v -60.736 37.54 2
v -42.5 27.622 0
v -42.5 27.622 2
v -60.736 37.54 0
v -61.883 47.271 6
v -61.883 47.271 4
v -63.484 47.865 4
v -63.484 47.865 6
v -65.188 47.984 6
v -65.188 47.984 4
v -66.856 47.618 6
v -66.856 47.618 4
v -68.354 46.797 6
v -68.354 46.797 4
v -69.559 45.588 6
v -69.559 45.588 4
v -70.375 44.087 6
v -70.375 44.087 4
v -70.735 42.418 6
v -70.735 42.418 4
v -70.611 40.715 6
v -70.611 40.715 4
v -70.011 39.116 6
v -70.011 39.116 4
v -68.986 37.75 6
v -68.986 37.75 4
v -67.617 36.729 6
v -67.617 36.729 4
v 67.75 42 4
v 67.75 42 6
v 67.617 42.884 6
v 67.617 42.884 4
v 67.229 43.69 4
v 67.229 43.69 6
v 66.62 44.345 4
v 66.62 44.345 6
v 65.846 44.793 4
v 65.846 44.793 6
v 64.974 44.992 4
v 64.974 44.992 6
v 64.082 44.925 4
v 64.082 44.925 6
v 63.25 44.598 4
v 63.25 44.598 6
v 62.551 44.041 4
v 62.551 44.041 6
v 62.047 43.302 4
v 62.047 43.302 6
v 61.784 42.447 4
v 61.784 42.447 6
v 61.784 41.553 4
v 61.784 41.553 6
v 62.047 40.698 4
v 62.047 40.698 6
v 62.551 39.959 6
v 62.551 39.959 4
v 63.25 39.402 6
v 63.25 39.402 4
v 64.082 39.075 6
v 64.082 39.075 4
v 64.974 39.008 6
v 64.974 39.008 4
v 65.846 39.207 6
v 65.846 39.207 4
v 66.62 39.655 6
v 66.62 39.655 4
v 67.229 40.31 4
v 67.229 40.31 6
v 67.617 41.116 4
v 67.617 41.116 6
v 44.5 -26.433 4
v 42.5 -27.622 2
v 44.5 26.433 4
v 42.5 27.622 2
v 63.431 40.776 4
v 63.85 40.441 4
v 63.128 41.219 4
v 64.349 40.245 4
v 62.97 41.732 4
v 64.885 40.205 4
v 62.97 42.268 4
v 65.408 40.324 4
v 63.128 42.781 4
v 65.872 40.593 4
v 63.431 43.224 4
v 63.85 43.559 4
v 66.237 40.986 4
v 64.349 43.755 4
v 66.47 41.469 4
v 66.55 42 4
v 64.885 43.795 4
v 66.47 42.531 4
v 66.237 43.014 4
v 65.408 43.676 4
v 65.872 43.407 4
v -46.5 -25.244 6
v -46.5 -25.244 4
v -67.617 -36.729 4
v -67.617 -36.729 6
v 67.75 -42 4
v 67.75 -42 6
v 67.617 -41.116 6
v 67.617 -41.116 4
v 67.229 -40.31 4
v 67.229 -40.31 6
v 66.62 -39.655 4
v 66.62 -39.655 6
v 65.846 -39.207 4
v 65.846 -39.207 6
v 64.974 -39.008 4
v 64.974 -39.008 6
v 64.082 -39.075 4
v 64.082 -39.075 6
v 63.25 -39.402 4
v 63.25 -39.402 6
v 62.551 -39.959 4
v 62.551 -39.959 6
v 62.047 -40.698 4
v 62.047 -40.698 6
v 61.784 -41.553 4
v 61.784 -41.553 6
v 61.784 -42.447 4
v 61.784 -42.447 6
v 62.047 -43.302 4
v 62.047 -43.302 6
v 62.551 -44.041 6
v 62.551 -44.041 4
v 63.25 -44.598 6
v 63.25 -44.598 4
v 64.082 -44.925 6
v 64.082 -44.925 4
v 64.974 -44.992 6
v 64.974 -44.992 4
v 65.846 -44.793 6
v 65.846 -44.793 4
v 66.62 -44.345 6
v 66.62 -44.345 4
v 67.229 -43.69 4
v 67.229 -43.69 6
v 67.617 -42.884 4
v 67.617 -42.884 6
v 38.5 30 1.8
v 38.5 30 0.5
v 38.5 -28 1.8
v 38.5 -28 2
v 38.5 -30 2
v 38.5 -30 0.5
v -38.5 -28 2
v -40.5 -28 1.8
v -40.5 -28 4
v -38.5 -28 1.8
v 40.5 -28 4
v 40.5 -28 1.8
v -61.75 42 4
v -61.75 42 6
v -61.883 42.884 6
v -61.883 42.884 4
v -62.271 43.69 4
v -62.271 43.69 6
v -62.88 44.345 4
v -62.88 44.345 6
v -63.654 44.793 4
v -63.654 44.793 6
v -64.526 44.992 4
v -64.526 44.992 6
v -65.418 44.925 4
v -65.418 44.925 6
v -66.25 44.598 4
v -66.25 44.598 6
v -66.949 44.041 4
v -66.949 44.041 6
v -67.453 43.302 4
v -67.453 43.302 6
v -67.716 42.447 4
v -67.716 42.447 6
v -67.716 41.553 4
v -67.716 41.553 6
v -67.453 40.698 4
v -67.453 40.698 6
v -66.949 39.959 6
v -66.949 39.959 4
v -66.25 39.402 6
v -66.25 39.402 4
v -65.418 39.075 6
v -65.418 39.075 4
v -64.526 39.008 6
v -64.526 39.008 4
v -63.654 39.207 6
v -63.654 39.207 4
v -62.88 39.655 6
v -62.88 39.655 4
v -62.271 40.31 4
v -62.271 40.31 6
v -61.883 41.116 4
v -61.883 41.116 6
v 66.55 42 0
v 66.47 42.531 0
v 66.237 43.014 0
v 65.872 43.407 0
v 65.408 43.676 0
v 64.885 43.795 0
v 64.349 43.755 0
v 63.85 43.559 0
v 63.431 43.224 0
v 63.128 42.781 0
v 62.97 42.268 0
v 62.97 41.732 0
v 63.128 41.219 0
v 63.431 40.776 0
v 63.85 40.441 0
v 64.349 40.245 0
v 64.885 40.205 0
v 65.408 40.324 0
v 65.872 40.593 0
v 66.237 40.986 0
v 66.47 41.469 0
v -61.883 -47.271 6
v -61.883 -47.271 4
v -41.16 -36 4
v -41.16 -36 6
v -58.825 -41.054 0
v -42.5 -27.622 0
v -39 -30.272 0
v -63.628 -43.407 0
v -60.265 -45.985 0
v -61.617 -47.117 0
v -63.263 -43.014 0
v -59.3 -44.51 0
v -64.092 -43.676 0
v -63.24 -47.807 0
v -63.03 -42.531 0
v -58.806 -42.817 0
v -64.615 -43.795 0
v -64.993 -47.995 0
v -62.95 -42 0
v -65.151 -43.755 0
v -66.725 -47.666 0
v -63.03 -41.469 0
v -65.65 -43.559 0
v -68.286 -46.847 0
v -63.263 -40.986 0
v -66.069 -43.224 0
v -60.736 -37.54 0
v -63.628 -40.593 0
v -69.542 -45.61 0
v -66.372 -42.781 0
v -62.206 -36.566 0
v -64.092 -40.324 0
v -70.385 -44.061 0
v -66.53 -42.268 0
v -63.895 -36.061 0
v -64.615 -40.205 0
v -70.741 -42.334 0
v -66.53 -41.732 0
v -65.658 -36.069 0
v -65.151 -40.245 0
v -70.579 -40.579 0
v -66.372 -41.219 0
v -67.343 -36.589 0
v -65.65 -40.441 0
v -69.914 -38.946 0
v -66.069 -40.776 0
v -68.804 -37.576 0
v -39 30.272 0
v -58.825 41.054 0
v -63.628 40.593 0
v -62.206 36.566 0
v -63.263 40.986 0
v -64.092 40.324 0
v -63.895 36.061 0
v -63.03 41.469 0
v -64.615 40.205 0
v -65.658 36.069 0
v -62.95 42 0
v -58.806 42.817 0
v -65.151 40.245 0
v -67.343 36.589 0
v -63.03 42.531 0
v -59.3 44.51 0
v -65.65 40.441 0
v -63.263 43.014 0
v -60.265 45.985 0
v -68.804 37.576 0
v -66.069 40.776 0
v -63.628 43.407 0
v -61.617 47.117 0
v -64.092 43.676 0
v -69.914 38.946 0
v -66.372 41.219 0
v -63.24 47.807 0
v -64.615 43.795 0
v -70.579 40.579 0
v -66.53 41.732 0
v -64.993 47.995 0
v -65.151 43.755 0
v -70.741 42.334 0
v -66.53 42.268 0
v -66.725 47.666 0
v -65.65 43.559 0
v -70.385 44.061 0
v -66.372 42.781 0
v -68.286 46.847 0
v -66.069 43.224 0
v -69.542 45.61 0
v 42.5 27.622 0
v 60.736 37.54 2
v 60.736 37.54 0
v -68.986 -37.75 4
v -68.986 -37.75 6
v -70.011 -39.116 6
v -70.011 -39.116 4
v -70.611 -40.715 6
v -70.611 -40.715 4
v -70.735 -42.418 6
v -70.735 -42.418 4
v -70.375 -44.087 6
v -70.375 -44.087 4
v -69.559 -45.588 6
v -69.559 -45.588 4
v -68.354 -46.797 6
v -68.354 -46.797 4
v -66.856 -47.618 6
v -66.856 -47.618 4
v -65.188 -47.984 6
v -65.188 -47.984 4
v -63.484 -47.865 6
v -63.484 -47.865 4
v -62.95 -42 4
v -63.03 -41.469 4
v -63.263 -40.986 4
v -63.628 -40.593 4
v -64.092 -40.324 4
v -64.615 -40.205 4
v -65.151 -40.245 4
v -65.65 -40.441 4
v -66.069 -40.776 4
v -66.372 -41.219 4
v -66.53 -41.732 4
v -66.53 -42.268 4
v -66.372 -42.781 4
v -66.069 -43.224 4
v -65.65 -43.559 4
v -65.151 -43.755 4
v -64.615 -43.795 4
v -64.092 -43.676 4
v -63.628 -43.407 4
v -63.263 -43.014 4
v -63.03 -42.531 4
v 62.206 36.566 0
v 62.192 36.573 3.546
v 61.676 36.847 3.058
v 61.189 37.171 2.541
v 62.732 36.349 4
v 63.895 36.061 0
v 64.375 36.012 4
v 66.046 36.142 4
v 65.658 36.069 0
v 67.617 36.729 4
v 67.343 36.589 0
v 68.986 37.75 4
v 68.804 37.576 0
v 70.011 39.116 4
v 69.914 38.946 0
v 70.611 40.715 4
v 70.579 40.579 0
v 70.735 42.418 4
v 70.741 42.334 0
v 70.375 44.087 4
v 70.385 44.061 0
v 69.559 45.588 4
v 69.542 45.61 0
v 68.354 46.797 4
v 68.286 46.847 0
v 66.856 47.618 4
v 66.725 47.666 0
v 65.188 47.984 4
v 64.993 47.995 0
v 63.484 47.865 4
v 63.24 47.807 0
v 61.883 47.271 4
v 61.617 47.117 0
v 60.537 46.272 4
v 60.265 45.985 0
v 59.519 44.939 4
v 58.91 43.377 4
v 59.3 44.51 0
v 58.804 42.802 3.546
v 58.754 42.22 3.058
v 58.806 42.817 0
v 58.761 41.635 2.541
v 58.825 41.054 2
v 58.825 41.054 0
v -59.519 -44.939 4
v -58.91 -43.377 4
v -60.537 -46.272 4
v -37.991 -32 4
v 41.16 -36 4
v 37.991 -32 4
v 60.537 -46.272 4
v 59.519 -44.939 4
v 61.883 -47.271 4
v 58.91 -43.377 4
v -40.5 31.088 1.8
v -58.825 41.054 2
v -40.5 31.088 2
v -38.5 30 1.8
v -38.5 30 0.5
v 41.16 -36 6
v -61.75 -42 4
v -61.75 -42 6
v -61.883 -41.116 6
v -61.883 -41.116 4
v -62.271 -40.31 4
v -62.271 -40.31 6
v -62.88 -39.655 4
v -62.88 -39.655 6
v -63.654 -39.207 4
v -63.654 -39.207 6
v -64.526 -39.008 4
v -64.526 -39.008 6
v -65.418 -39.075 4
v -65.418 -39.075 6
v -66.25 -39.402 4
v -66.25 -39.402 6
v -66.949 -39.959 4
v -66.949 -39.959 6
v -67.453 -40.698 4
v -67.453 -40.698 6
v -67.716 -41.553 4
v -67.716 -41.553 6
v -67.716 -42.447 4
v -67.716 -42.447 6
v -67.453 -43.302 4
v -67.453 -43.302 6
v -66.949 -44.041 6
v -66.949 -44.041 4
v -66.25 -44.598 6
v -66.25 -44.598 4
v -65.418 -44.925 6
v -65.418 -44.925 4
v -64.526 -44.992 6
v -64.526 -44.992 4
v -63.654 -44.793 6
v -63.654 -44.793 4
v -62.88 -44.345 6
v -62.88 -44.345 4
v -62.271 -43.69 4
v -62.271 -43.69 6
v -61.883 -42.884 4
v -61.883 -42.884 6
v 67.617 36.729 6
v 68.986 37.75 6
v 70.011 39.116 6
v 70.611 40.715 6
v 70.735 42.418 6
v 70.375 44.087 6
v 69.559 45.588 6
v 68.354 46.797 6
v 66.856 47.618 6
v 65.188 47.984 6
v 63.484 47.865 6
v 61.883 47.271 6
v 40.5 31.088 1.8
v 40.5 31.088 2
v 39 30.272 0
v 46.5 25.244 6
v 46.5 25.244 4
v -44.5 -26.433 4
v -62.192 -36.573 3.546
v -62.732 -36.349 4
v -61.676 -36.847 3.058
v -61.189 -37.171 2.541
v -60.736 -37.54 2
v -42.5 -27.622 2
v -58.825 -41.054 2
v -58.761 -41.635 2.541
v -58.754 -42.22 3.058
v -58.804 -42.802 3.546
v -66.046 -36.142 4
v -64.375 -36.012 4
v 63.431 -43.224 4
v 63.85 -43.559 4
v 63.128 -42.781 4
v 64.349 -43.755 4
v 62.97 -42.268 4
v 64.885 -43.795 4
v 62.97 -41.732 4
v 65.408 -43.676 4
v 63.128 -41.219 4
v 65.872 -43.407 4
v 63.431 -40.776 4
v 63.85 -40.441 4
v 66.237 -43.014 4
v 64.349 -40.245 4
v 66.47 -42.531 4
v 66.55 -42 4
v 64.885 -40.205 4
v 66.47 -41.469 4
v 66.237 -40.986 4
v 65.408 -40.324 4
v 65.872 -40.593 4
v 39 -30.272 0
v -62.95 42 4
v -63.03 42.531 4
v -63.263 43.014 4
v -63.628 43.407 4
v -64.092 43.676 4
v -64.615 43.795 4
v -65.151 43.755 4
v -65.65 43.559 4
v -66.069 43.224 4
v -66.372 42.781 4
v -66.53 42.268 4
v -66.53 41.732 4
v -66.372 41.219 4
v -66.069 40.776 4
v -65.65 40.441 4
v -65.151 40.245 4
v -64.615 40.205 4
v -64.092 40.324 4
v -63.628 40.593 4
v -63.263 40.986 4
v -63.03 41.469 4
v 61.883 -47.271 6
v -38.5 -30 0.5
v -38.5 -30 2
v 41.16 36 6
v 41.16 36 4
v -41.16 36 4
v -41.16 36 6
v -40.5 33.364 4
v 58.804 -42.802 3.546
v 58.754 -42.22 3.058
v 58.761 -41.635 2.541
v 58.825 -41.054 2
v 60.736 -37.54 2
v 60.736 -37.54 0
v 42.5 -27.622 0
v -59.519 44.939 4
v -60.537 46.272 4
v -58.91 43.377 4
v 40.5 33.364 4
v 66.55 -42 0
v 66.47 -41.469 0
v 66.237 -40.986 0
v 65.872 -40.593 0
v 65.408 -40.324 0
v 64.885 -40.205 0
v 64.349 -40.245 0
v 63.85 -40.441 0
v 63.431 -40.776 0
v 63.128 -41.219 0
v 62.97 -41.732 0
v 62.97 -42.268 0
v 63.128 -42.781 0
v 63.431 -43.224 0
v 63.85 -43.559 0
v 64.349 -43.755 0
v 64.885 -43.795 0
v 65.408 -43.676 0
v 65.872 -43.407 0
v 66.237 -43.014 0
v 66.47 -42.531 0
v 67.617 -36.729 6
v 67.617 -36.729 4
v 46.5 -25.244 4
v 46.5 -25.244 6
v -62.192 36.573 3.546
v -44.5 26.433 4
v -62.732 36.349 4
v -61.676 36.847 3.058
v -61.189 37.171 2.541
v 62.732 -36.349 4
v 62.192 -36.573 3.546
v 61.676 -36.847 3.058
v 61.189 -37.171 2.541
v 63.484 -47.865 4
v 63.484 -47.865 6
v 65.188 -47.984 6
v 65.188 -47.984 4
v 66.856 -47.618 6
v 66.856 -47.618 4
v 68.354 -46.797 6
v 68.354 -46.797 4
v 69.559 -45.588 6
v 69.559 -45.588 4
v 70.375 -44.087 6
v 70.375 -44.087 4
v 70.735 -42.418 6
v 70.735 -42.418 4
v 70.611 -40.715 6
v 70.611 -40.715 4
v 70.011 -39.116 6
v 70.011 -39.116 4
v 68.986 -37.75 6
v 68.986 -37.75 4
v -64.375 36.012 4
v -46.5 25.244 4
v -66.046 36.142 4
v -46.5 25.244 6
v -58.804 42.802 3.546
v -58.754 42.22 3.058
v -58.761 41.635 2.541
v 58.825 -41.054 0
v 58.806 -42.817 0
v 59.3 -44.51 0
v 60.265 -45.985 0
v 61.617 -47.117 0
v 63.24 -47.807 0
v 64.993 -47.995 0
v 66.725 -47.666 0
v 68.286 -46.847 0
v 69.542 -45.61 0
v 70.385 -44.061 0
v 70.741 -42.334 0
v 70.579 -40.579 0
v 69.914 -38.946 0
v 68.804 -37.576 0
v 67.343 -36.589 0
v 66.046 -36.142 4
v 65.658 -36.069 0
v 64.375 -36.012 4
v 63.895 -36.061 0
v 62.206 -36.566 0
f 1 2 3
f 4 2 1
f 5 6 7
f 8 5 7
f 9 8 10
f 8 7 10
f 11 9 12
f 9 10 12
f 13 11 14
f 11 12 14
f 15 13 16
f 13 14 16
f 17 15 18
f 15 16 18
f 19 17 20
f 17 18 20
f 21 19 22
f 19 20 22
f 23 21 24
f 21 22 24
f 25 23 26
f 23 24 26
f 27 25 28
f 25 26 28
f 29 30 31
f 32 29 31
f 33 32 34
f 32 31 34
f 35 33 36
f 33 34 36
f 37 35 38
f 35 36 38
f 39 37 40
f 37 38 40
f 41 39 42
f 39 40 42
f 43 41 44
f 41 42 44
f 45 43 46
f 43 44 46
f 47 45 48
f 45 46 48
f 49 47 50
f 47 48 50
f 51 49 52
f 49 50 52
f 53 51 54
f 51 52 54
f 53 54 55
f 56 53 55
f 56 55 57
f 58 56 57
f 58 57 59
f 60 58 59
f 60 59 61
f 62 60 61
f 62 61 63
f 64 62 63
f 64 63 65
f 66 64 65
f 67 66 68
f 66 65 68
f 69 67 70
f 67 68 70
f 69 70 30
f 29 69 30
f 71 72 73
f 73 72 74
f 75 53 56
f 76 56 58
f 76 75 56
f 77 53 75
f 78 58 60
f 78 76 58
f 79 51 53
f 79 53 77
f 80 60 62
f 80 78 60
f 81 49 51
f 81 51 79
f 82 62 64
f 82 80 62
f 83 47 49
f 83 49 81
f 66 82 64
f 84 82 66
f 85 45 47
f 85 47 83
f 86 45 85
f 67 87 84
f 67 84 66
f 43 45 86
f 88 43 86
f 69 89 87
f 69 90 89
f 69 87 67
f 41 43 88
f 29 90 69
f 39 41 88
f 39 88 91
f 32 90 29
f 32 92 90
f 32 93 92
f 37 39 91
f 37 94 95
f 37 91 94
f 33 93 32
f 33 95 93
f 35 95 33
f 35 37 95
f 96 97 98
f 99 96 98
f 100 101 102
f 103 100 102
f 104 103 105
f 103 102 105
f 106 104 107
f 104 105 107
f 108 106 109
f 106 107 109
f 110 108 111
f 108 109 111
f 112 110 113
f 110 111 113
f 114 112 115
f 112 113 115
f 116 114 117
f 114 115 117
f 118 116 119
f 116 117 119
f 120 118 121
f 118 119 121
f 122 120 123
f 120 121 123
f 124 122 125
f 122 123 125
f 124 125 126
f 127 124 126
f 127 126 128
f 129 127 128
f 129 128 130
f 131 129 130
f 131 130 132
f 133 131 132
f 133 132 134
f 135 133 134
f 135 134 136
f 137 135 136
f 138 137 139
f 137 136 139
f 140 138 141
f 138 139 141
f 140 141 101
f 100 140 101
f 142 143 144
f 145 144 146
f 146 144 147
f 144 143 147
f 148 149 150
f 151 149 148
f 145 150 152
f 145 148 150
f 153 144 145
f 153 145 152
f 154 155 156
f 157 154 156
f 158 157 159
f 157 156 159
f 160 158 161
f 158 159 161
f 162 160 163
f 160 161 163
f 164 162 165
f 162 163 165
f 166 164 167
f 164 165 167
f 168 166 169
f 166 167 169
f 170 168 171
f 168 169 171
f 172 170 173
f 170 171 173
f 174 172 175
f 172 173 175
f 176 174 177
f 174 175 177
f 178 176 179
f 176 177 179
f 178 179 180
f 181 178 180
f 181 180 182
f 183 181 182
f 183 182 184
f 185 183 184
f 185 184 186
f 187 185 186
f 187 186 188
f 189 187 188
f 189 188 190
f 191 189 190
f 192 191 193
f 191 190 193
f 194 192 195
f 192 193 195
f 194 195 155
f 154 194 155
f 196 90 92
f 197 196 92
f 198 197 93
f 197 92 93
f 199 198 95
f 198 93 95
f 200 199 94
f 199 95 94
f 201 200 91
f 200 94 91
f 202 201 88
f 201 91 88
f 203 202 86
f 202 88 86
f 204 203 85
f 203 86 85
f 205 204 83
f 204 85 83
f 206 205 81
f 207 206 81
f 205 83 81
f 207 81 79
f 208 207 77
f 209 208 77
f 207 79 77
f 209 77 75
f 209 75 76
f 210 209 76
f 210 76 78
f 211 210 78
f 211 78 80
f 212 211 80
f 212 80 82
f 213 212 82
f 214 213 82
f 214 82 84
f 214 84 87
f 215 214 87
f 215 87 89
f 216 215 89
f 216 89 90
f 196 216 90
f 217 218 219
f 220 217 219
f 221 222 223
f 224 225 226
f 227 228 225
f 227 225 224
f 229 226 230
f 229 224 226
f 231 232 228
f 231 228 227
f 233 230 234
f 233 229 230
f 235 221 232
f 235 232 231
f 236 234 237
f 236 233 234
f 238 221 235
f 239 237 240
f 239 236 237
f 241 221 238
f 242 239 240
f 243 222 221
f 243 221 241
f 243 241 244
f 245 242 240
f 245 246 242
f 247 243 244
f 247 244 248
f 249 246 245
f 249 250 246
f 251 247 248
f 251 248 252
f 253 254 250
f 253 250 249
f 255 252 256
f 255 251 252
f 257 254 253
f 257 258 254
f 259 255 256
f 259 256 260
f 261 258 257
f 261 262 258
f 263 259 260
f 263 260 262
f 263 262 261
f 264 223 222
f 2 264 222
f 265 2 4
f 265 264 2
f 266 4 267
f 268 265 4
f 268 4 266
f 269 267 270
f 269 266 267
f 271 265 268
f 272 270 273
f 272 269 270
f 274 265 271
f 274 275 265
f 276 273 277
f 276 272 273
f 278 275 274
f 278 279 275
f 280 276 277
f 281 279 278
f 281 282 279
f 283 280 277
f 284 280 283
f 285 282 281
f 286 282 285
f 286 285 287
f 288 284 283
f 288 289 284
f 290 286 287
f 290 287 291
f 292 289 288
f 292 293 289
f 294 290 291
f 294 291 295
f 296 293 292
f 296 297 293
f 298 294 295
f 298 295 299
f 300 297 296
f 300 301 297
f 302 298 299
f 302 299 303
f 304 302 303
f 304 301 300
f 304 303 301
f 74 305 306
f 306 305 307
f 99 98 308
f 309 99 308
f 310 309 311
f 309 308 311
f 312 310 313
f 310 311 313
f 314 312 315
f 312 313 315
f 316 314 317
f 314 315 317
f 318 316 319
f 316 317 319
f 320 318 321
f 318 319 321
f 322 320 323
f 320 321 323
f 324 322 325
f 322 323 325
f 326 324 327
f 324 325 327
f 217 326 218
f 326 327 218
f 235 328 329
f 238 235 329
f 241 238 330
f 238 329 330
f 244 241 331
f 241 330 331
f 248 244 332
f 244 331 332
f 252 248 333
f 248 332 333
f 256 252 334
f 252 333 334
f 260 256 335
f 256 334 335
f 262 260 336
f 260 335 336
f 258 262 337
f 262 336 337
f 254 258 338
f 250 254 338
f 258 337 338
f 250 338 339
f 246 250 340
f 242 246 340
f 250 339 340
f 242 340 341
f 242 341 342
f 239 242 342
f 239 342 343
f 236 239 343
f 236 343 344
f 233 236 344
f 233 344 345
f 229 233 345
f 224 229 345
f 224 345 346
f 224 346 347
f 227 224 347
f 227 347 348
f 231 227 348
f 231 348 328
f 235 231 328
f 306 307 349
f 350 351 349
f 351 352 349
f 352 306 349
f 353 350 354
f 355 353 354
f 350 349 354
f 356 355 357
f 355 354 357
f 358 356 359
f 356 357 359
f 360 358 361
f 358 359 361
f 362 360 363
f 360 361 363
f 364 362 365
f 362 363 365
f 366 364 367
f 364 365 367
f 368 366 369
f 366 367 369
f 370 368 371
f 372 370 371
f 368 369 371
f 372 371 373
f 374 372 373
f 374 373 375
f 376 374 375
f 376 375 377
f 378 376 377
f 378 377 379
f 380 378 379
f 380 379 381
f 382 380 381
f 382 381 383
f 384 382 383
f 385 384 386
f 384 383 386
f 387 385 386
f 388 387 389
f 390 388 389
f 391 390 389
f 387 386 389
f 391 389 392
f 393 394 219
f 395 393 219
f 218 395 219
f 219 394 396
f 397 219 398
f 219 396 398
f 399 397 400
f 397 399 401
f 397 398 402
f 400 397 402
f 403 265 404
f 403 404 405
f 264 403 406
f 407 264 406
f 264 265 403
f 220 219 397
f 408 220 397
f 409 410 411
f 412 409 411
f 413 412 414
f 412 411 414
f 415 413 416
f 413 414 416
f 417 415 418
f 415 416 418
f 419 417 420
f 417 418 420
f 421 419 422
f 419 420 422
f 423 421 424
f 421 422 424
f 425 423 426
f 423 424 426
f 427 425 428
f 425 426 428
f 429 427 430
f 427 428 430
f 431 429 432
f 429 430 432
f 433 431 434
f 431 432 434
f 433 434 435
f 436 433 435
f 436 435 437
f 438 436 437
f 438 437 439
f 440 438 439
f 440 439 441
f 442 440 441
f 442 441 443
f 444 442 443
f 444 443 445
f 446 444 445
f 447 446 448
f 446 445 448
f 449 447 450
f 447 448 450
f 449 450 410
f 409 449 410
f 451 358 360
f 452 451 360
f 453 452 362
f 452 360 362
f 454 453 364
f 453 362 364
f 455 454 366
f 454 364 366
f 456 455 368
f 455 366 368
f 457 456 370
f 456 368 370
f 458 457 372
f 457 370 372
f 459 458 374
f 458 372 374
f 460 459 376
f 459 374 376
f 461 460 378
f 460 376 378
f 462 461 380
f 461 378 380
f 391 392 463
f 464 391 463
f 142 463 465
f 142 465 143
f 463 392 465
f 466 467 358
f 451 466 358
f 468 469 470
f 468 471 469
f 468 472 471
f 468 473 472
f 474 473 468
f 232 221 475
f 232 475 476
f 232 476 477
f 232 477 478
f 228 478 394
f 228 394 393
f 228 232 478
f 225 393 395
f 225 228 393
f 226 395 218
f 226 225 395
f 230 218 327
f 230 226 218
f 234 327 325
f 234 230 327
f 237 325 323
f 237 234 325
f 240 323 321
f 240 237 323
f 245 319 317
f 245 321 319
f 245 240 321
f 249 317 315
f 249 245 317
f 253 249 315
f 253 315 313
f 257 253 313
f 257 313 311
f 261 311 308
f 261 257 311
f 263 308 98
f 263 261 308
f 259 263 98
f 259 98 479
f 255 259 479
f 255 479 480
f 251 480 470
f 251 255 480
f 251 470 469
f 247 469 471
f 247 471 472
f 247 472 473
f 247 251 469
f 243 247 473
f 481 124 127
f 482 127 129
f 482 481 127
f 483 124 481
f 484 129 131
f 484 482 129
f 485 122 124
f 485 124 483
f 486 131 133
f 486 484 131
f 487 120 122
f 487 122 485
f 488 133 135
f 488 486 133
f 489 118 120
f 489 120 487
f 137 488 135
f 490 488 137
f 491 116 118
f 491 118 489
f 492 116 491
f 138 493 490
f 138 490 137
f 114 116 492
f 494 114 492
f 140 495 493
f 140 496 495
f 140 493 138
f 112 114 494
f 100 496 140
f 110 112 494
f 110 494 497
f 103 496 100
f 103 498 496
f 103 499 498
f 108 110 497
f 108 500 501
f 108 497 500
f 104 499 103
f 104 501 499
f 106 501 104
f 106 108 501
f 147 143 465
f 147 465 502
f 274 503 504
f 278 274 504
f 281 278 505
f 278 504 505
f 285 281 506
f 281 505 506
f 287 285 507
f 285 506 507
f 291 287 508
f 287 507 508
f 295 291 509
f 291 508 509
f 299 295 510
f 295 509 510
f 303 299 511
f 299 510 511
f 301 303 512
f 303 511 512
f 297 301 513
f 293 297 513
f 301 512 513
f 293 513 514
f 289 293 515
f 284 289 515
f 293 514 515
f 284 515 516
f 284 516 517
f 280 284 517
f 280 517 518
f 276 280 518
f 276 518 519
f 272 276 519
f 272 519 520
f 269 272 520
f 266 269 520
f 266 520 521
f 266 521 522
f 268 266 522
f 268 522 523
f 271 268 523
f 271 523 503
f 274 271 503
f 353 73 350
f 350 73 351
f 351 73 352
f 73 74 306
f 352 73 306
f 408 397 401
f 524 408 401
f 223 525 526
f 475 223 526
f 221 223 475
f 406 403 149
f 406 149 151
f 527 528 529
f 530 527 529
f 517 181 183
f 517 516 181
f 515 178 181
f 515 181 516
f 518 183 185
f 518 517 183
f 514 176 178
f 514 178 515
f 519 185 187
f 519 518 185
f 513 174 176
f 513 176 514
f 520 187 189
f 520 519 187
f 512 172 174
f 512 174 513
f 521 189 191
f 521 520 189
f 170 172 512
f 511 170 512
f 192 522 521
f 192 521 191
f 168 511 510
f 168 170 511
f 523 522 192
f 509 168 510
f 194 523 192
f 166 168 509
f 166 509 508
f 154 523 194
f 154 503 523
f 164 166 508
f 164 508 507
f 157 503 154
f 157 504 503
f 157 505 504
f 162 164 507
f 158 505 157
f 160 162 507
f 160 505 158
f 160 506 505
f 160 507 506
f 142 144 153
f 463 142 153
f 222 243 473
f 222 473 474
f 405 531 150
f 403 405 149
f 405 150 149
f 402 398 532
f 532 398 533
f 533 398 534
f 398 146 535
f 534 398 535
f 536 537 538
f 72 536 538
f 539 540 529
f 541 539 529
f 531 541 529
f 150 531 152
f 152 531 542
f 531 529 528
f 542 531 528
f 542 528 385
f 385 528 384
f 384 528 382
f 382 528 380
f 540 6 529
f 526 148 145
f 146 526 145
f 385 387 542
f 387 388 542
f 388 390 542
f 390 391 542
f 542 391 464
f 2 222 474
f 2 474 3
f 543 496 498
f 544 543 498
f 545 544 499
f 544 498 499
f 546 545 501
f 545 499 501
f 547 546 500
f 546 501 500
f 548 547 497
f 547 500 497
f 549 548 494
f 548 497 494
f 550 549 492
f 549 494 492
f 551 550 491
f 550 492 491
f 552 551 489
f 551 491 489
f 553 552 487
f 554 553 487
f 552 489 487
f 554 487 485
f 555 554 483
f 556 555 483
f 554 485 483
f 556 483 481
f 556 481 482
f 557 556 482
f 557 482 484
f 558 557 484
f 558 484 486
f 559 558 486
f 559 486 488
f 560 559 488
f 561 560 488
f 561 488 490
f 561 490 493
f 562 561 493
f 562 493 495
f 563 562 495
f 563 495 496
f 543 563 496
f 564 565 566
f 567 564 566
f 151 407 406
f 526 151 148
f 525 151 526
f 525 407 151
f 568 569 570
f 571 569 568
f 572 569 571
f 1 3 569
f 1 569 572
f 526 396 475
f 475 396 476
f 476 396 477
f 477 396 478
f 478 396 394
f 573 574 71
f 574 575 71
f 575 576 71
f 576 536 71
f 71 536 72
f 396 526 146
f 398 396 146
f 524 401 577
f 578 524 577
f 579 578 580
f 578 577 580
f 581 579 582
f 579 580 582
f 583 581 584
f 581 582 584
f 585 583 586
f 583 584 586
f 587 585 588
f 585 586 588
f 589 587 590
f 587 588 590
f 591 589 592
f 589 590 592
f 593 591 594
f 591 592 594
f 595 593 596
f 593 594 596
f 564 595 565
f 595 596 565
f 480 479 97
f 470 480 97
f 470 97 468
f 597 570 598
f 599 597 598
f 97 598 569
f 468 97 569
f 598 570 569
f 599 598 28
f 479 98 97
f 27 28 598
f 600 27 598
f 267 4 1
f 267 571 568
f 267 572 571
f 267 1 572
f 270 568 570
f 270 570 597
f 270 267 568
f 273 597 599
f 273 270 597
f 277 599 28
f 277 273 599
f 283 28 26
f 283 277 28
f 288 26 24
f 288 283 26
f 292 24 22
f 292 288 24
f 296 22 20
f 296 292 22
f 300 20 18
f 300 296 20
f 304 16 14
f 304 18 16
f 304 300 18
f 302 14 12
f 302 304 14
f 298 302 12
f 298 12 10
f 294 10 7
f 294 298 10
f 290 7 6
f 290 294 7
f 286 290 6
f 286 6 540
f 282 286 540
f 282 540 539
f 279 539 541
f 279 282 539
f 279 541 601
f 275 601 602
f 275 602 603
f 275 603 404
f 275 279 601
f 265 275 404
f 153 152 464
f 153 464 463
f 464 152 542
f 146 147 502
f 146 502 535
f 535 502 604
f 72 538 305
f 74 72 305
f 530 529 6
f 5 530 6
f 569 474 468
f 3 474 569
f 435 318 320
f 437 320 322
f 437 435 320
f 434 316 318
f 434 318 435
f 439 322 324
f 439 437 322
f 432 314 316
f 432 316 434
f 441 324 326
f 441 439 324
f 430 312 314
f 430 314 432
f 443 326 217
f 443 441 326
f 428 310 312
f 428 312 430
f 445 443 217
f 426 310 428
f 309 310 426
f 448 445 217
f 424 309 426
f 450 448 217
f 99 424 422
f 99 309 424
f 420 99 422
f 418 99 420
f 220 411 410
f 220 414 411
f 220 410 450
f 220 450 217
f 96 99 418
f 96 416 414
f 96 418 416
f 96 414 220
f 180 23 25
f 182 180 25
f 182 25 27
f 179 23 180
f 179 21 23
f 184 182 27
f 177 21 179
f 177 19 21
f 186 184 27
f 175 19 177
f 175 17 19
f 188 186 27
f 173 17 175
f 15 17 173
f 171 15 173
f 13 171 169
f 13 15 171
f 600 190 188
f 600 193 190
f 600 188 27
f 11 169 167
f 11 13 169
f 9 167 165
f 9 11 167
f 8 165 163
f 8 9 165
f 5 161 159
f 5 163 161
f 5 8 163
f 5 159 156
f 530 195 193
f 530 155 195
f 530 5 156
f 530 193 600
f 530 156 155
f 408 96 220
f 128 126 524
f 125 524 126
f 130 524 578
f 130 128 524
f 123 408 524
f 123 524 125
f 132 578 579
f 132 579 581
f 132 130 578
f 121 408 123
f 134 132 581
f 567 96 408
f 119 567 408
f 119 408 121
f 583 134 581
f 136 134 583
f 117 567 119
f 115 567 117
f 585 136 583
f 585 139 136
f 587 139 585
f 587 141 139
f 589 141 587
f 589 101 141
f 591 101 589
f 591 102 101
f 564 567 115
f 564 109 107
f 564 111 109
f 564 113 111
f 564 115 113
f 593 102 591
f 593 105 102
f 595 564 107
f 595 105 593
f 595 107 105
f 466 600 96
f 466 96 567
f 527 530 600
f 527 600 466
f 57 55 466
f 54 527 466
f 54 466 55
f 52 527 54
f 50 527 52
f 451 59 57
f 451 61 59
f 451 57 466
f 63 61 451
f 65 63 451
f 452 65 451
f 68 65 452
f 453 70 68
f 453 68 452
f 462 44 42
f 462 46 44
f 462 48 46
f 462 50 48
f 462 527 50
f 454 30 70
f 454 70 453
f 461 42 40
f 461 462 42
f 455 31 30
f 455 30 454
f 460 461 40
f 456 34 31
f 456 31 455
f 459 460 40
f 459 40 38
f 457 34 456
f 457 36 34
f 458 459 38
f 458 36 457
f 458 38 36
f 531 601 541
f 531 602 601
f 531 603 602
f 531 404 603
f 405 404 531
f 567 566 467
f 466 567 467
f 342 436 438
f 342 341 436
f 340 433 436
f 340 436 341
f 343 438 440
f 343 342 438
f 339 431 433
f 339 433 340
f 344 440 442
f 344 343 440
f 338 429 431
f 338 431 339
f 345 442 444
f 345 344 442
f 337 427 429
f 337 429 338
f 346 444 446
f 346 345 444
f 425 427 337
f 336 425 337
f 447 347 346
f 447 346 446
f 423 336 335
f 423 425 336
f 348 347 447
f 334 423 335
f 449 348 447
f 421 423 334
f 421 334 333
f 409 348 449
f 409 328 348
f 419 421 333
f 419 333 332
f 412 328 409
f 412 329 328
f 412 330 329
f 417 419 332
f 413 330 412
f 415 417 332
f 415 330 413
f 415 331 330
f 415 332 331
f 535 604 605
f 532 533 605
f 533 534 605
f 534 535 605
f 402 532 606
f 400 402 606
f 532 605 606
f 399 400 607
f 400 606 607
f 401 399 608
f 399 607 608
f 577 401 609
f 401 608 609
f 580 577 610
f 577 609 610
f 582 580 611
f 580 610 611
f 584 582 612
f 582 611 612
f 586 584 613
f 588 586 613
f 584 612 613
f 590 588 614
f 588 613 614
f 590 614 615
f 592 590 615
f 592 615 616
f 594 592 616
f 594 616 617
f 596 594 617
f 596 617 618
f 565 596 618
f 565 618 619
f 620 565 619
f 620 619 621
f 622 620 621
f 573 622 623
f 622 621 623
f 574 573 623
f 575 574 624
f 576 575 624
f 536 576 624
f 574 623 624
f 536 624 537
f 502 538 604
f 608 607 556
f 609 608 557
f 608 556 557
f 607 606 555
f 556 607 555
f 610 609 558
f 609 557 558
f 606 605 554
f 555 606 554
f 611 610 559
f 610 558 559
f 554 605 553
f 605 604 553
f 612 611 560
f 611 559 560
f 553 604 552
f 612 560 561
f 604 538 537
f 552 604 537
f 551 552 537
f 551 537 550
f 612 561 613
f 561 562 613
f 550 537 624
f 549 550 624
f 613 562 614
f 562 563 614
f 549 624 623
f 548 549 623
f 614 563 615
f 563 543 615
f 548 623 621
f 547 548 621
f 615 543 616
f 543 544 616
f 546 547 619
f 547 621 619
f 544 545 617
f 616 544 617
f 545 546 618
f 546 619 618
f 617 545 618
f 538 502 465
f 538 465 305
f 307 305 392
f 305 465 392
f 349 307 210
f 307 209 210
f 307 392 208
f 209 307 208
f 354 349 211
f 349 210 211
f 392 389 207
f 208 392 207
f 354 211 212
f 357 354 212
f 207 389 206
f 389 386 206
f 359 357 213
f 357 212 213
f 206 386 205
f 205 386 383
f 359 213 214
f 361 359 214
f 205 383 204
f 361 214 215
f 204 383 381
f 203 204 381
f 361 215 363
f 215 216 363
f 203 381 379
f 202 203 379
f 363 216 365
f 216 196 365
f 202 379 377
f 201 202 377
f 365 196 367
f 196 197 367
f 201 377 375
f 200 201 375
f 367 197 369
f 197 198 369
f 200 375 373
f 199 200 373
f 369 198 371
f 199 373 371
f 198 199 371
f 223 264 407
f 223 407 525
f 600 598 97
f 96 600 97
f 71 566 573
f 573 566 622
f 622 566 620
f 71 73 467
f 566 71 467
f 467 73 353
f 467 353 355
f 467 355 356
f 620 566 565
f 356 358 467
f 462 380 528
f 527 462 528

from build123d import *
from build123d.topology import SkipClean

# Parameters (mm, degrees)
BOSS_EXTRUDE4_DEPTH            = 4
BOSS_EXTRUDE4_2_DEPTH          = 4
BOSS_EXTRUDE7_START            = 4
SKETCH13_W                     = 77
SKETCH13_H                     = 2
BOSS_EXTRUDE7_DEPTH            = 2
CUT_EXTRUDE3_REACH             = 87.589
SKETCH11_W                     = 2
SKETCH11_H                     = 2.2
CUT_EXTRUDE3_DIRECTION_2_REACH = 87.589
BOSS_EXTRUDE6_DEPTH            = 2
M3_CLEARANCE_HOLE1_D           = 3.6
SKETCH16_R                     = 3
CUT_EXTRUDE4_DEPTH             = 2
CHAMFER2_SIZE                  = 2
CHAMFER3_SIZE                  = 0.5


with BuildPart() as part:
    # Sketch9 → Boss-Extrude4 (new body)
    with BuildSketch(Plane.XY):
        with BuildLine():
            Line((-60.736133913, -37.540305051), (-42.5, -27.622167018))
            Line((-42.5, -27.622167018), (-42.5, 27.622167018))
            Line((-42.5, 27.622167018), (-60.736133913, 37.540305051))
            ThreePointArc((-60.736133913, 37.540305051), (-70.020874221, 44.866685358), (-58.825010341, 41.054221199))
            Line((-58.825010341, 41.054221199), (-38.5, 30))
            Line((-38.5, 30), (-38.5, -30))
            Line((-38.5, -30), (-58.825010341, -41.054221199))
            ThreePointArc((-58.825010341, -41.054221199), (-70.020874221, -44.866685358), (-60.736133913, -37.540305051))
        make_face()
    extrude(amount=BOSS_EXTRUDE4_DEPTH)



with BuildPart() as body_2:
    # Sketch9 → Boss-Extrude4 2 (new body)
    with BuildSketch(Plane.XY):
        with BuildLine():
            Line((38.5, -30), (58.825010341, -41.054221199))
            ThreePointArc((58.825010341, -41.054221199), (70.020874221, -44.866685358), (60.736133913, -37.540305051))
            Line((60.736133913, -37.540305051), (42.5, -27.622167018))
            Line((42.5, -27.622167018), (42.5, 27.622167018))
            Line((42.5, 27.622167018), (60.736133913, 37.540305051))
            ThreePointArc((60.736133913, 37.540305051), (70.020874221, 44.866685358), (58.825010341, 41.054221199))
            Line((58.825010341, 41.054221199), (38.5, 30))
            Line((38.5, 30), (38.5, -30))
        make_face()
    extrude(amount=BOSS_EXTRUDE4_2_DEPTH)


with BuildPart() as part_1:
    add(part.part)

    add(body_2.part)  # Boss-Extrude7 merges body 2
    # Sketch13 → Boss-Extrude7 (add)
    with BuildSketch(Plane.XY.offset(BOSS_EXTRUDE7_START)):
        with Locations((0, -29)):
            Rectangle(SKETCH13_W, SKETCH13_H)
    extrude(amount=-BOSS_EXTRUDE7_DEPTH)

    # Cut-Extrude3: up to this face of the body (flat: up to its plane)
    cut_extrude3_end = Plane(part_1.part.faces().sort_by_distance((0, -28, 3))[0])
    # Sketch11 → Cut-Extrude3 (cut, up to the picked face)
    with BuildSketch(Plane(origin=(0, 0, 0), x_dir=(1, 0, 0), z_dir=(0, 1, 0)), mode=Mode.PRIVATE) as cut_extrude3_sk1:
        with Locations((-39.5, -2.9)):
            Rectangle(SKETCH11_W, SKETCH11_H)
    cut_extrude3_tool1 = split(extrude(cut_extrude3_sk1.sketch, amount=-CUT_EXTRUDE3_REACH, mode=Mode.PRIVATE), bisect_by=cut_extrude3_end, keep=Keep.BOTH, mode=Mode.PRIVATE)
    # Sketch11 → Cut-Extrude3 (cut, up to the picked face)
    with BuildSketch(Plane(origin=(0, 0, 0), x_dir=(1, 0, 0), z_dir=(0, 1, 0)), mode=Mode.PRIVATE) as cut_extrude3_sk2:
        with Locations((39.5, -2.9)):
            Rectangle(SKETCH11_W, SKETCH11_H)
    cut_extrude3_tool2 = split(extrude(cut_extrude3_sk2.sketch, amount=-CUT_EXTRUDE3_REACH, mode=Mode.PRIVATE), bisect_by=cut_extrude3_end, keep=Keep.BOTH, mode=Mode.PRIVATE)
    add(cut_extrude3_tool1.solids().sort_by(Axis((-39.5, 0, 2.9), (0, -1, 0)))[0], mode=Mode.SUBTRACT)
    add(cut_extrude3_tool2.solids().sort_by(Axis((39.5, 0, 2.9), (0, -1, 0)))[0], mode=Mode.SUBTRACT)

    # Sketch11 → Cut-Extrude3 direction 2 (cut, up to next)
    with BuildSketch(Plane(origin=(0, 0, 0), x_dir=(1, 0, 0), z_dir=(0, 1, 0)), mode=Mode.PRIVATE) as cut_extrude3_direction_2_sk1:
        with Locations((-39.5, -2.9)):
            Rectangle(SKETCH11_W, SKETCH11_H)
    cut_extrude3_direction_2_tool1 = extrude(cut_extrude3_direction_2_sk1.sketch, amount=CUT_EXTRUDE3_DIRECTION_2_REACH, mode=Mode.PRIVATE) & part_1.part
    # Sketch11 → Cut-Extrude3 direction 2 (cut, up to next)
    with BuildSketch(Plane(origin=(0, 0, 0), x_dir=(1, 0, 0), z_dir=(0, 1, 0)), mode=Mode.PRIVATE) as cut_extrude3_direction_2_sk2:
        with Locations((39.5, -2.9)):
            Rectangle(SKETCH11_W, SKETCH11_H)
    cut_extrude3_direction_2_tool2 = extrude(cut_extrude3_direction_2_sk2.sketch, amount=CUT_EXTRUDE3_DIRECTION_2_REACH, mode=Mode.PRIVATE) & part_1.part
    add(cut_extrude3_direction_2_tool1.solids().sort_by_distance((-39.5, 0, 2.9))[0], mode=Mode.SUBTRACT)
    add(cut_extrude3_direction_2_tool2.solids().sort_by_distance((39.5, 0, 2.9))[0], mode=Mode.SUBTRACT)

    # Sketch12 → Boss-Extrude6 (add)
    with SkipClean():  # the faces are left unmerged after this step: merging them gives an invalid solid
        with BuildSketch(Plane.XY.offset(4)):
            with BuildLine():
                Line((-67.616685358, 36.729125779), (-46.5, 25.244334036))
                Line((-46.5, 25.244334036), (-46.5, -25.244334036))
                Line((-46.5, -25.244334036), (-67.616685358, -36.729125779))
                ThreePointArc((-67.616685358, -36.729125779), (-70.020874221, -44.866685358), (-61.883314642, -47.270874221))
                Line((-61.883314642, -47.270874221), (-41.159951957, -36))
                Line((-41.159951957, -36), (41.159951957, -36))
                Line((41.159951957, -36), (61.883314642, -47.270874221))
                ThreePointArc((61.883314642, -47.270874221), (70.020874221, -44.866685358), (67.616685358, -36.729125779))
                Line((67.616685358, -36.729125779), (46.5, -25.244334036))
                Line((46.5, -25.244334036), (46.5, 25.244334036))
                Line((46.5, 25.244334036), (67.616685358, 36.729125779))
                ThreePointArc((67.616685358, 36.729125779), (70.020874221, 44.866685358), (61.883314642, 47.270874221))
                Line((61.883314642, 47.270874221), (41.159951957, 36))
                Line((41.159951957, 36), (-41.159951957, 36))
                Line((-41.159951957, 36), (-61.883314642, 47.270874221))
                ThreePointArc((-61.883314642, 47.270874221), (-70.020874221, 44.866685358), (-67.616685358, 36.729125779))
            make_face()
        extrude(amount=BOSS_EXTRUDE6_DEPTH)

    # M3 Clearance Hole1 (through all)
    with Locations(Plane(origin=(0, 0, 0), x_dir=(-1, 0, 0), z_dir=(0, 0, -1))):
        with Locations((64.75, 42), (64.75, -42), (-64.75, -42), (-64.75, 42)):
            Hole(M3_CLEARANCE_HOLE1_D / 2)

    # Sketch16 → Cut-Extrude4 (cut)
    with SkipClean():  # the faces are left unmerged after this step: merging them gives an invalid solid
        with BuildSketch(Plane.XY.offset(6)):
            with Locations((-64.75, 42)):
                Circle(SKETCH16_R)
            with Locations((-64.75, -42)):
                Circle(SKETCH16_R)
            with Locations((64.75, -42)):
                Circle(SKETCH16_R)
            with Locations((64.75, 42)):
                Circle(SKETCH16_R)
        extrude(amount=-CUT_EXTRUDE4_DEPTH, mode=Mode.SUBTRACT)

    # Chamfer2
    chamfer2_edges = [part_1.edges().sort_by_distance(p)[0] for p in [
        (-49.662505171, 36.070983444, 4),
        (49.662505171, 36.070983444, 4),
        (51.618066957, 32.581236035, 4),
        (42.5, 0, 4),
        (51.618066957, -32.581236035, 4),
        (48.662505171, -35.527110599, 4),
        (-48.662505171, -35.527110599, 4),
        (-51.618066957, -32.581236035, 4),
        (-51.618066957, 32.581236035, 4),
        (-42.5, 0, 4),
        (0, -30, 4),
    ]]
    chamfer(chamfer2_edges, length=CHAMFER2_SIZE - 0.0001)  # a hair under: the kernel refuses the full size

    # Chamfer3
    chamfer3_edges = [part_1.edges().sort_by_distance(p)[0] for p in [
        (-38.5, 0, 0),
        (38.5, 0, 0),
    ]]
    chamfer(chamfer3_edges, length=CHAMFER3_SIZE)


solid = part_1.part
